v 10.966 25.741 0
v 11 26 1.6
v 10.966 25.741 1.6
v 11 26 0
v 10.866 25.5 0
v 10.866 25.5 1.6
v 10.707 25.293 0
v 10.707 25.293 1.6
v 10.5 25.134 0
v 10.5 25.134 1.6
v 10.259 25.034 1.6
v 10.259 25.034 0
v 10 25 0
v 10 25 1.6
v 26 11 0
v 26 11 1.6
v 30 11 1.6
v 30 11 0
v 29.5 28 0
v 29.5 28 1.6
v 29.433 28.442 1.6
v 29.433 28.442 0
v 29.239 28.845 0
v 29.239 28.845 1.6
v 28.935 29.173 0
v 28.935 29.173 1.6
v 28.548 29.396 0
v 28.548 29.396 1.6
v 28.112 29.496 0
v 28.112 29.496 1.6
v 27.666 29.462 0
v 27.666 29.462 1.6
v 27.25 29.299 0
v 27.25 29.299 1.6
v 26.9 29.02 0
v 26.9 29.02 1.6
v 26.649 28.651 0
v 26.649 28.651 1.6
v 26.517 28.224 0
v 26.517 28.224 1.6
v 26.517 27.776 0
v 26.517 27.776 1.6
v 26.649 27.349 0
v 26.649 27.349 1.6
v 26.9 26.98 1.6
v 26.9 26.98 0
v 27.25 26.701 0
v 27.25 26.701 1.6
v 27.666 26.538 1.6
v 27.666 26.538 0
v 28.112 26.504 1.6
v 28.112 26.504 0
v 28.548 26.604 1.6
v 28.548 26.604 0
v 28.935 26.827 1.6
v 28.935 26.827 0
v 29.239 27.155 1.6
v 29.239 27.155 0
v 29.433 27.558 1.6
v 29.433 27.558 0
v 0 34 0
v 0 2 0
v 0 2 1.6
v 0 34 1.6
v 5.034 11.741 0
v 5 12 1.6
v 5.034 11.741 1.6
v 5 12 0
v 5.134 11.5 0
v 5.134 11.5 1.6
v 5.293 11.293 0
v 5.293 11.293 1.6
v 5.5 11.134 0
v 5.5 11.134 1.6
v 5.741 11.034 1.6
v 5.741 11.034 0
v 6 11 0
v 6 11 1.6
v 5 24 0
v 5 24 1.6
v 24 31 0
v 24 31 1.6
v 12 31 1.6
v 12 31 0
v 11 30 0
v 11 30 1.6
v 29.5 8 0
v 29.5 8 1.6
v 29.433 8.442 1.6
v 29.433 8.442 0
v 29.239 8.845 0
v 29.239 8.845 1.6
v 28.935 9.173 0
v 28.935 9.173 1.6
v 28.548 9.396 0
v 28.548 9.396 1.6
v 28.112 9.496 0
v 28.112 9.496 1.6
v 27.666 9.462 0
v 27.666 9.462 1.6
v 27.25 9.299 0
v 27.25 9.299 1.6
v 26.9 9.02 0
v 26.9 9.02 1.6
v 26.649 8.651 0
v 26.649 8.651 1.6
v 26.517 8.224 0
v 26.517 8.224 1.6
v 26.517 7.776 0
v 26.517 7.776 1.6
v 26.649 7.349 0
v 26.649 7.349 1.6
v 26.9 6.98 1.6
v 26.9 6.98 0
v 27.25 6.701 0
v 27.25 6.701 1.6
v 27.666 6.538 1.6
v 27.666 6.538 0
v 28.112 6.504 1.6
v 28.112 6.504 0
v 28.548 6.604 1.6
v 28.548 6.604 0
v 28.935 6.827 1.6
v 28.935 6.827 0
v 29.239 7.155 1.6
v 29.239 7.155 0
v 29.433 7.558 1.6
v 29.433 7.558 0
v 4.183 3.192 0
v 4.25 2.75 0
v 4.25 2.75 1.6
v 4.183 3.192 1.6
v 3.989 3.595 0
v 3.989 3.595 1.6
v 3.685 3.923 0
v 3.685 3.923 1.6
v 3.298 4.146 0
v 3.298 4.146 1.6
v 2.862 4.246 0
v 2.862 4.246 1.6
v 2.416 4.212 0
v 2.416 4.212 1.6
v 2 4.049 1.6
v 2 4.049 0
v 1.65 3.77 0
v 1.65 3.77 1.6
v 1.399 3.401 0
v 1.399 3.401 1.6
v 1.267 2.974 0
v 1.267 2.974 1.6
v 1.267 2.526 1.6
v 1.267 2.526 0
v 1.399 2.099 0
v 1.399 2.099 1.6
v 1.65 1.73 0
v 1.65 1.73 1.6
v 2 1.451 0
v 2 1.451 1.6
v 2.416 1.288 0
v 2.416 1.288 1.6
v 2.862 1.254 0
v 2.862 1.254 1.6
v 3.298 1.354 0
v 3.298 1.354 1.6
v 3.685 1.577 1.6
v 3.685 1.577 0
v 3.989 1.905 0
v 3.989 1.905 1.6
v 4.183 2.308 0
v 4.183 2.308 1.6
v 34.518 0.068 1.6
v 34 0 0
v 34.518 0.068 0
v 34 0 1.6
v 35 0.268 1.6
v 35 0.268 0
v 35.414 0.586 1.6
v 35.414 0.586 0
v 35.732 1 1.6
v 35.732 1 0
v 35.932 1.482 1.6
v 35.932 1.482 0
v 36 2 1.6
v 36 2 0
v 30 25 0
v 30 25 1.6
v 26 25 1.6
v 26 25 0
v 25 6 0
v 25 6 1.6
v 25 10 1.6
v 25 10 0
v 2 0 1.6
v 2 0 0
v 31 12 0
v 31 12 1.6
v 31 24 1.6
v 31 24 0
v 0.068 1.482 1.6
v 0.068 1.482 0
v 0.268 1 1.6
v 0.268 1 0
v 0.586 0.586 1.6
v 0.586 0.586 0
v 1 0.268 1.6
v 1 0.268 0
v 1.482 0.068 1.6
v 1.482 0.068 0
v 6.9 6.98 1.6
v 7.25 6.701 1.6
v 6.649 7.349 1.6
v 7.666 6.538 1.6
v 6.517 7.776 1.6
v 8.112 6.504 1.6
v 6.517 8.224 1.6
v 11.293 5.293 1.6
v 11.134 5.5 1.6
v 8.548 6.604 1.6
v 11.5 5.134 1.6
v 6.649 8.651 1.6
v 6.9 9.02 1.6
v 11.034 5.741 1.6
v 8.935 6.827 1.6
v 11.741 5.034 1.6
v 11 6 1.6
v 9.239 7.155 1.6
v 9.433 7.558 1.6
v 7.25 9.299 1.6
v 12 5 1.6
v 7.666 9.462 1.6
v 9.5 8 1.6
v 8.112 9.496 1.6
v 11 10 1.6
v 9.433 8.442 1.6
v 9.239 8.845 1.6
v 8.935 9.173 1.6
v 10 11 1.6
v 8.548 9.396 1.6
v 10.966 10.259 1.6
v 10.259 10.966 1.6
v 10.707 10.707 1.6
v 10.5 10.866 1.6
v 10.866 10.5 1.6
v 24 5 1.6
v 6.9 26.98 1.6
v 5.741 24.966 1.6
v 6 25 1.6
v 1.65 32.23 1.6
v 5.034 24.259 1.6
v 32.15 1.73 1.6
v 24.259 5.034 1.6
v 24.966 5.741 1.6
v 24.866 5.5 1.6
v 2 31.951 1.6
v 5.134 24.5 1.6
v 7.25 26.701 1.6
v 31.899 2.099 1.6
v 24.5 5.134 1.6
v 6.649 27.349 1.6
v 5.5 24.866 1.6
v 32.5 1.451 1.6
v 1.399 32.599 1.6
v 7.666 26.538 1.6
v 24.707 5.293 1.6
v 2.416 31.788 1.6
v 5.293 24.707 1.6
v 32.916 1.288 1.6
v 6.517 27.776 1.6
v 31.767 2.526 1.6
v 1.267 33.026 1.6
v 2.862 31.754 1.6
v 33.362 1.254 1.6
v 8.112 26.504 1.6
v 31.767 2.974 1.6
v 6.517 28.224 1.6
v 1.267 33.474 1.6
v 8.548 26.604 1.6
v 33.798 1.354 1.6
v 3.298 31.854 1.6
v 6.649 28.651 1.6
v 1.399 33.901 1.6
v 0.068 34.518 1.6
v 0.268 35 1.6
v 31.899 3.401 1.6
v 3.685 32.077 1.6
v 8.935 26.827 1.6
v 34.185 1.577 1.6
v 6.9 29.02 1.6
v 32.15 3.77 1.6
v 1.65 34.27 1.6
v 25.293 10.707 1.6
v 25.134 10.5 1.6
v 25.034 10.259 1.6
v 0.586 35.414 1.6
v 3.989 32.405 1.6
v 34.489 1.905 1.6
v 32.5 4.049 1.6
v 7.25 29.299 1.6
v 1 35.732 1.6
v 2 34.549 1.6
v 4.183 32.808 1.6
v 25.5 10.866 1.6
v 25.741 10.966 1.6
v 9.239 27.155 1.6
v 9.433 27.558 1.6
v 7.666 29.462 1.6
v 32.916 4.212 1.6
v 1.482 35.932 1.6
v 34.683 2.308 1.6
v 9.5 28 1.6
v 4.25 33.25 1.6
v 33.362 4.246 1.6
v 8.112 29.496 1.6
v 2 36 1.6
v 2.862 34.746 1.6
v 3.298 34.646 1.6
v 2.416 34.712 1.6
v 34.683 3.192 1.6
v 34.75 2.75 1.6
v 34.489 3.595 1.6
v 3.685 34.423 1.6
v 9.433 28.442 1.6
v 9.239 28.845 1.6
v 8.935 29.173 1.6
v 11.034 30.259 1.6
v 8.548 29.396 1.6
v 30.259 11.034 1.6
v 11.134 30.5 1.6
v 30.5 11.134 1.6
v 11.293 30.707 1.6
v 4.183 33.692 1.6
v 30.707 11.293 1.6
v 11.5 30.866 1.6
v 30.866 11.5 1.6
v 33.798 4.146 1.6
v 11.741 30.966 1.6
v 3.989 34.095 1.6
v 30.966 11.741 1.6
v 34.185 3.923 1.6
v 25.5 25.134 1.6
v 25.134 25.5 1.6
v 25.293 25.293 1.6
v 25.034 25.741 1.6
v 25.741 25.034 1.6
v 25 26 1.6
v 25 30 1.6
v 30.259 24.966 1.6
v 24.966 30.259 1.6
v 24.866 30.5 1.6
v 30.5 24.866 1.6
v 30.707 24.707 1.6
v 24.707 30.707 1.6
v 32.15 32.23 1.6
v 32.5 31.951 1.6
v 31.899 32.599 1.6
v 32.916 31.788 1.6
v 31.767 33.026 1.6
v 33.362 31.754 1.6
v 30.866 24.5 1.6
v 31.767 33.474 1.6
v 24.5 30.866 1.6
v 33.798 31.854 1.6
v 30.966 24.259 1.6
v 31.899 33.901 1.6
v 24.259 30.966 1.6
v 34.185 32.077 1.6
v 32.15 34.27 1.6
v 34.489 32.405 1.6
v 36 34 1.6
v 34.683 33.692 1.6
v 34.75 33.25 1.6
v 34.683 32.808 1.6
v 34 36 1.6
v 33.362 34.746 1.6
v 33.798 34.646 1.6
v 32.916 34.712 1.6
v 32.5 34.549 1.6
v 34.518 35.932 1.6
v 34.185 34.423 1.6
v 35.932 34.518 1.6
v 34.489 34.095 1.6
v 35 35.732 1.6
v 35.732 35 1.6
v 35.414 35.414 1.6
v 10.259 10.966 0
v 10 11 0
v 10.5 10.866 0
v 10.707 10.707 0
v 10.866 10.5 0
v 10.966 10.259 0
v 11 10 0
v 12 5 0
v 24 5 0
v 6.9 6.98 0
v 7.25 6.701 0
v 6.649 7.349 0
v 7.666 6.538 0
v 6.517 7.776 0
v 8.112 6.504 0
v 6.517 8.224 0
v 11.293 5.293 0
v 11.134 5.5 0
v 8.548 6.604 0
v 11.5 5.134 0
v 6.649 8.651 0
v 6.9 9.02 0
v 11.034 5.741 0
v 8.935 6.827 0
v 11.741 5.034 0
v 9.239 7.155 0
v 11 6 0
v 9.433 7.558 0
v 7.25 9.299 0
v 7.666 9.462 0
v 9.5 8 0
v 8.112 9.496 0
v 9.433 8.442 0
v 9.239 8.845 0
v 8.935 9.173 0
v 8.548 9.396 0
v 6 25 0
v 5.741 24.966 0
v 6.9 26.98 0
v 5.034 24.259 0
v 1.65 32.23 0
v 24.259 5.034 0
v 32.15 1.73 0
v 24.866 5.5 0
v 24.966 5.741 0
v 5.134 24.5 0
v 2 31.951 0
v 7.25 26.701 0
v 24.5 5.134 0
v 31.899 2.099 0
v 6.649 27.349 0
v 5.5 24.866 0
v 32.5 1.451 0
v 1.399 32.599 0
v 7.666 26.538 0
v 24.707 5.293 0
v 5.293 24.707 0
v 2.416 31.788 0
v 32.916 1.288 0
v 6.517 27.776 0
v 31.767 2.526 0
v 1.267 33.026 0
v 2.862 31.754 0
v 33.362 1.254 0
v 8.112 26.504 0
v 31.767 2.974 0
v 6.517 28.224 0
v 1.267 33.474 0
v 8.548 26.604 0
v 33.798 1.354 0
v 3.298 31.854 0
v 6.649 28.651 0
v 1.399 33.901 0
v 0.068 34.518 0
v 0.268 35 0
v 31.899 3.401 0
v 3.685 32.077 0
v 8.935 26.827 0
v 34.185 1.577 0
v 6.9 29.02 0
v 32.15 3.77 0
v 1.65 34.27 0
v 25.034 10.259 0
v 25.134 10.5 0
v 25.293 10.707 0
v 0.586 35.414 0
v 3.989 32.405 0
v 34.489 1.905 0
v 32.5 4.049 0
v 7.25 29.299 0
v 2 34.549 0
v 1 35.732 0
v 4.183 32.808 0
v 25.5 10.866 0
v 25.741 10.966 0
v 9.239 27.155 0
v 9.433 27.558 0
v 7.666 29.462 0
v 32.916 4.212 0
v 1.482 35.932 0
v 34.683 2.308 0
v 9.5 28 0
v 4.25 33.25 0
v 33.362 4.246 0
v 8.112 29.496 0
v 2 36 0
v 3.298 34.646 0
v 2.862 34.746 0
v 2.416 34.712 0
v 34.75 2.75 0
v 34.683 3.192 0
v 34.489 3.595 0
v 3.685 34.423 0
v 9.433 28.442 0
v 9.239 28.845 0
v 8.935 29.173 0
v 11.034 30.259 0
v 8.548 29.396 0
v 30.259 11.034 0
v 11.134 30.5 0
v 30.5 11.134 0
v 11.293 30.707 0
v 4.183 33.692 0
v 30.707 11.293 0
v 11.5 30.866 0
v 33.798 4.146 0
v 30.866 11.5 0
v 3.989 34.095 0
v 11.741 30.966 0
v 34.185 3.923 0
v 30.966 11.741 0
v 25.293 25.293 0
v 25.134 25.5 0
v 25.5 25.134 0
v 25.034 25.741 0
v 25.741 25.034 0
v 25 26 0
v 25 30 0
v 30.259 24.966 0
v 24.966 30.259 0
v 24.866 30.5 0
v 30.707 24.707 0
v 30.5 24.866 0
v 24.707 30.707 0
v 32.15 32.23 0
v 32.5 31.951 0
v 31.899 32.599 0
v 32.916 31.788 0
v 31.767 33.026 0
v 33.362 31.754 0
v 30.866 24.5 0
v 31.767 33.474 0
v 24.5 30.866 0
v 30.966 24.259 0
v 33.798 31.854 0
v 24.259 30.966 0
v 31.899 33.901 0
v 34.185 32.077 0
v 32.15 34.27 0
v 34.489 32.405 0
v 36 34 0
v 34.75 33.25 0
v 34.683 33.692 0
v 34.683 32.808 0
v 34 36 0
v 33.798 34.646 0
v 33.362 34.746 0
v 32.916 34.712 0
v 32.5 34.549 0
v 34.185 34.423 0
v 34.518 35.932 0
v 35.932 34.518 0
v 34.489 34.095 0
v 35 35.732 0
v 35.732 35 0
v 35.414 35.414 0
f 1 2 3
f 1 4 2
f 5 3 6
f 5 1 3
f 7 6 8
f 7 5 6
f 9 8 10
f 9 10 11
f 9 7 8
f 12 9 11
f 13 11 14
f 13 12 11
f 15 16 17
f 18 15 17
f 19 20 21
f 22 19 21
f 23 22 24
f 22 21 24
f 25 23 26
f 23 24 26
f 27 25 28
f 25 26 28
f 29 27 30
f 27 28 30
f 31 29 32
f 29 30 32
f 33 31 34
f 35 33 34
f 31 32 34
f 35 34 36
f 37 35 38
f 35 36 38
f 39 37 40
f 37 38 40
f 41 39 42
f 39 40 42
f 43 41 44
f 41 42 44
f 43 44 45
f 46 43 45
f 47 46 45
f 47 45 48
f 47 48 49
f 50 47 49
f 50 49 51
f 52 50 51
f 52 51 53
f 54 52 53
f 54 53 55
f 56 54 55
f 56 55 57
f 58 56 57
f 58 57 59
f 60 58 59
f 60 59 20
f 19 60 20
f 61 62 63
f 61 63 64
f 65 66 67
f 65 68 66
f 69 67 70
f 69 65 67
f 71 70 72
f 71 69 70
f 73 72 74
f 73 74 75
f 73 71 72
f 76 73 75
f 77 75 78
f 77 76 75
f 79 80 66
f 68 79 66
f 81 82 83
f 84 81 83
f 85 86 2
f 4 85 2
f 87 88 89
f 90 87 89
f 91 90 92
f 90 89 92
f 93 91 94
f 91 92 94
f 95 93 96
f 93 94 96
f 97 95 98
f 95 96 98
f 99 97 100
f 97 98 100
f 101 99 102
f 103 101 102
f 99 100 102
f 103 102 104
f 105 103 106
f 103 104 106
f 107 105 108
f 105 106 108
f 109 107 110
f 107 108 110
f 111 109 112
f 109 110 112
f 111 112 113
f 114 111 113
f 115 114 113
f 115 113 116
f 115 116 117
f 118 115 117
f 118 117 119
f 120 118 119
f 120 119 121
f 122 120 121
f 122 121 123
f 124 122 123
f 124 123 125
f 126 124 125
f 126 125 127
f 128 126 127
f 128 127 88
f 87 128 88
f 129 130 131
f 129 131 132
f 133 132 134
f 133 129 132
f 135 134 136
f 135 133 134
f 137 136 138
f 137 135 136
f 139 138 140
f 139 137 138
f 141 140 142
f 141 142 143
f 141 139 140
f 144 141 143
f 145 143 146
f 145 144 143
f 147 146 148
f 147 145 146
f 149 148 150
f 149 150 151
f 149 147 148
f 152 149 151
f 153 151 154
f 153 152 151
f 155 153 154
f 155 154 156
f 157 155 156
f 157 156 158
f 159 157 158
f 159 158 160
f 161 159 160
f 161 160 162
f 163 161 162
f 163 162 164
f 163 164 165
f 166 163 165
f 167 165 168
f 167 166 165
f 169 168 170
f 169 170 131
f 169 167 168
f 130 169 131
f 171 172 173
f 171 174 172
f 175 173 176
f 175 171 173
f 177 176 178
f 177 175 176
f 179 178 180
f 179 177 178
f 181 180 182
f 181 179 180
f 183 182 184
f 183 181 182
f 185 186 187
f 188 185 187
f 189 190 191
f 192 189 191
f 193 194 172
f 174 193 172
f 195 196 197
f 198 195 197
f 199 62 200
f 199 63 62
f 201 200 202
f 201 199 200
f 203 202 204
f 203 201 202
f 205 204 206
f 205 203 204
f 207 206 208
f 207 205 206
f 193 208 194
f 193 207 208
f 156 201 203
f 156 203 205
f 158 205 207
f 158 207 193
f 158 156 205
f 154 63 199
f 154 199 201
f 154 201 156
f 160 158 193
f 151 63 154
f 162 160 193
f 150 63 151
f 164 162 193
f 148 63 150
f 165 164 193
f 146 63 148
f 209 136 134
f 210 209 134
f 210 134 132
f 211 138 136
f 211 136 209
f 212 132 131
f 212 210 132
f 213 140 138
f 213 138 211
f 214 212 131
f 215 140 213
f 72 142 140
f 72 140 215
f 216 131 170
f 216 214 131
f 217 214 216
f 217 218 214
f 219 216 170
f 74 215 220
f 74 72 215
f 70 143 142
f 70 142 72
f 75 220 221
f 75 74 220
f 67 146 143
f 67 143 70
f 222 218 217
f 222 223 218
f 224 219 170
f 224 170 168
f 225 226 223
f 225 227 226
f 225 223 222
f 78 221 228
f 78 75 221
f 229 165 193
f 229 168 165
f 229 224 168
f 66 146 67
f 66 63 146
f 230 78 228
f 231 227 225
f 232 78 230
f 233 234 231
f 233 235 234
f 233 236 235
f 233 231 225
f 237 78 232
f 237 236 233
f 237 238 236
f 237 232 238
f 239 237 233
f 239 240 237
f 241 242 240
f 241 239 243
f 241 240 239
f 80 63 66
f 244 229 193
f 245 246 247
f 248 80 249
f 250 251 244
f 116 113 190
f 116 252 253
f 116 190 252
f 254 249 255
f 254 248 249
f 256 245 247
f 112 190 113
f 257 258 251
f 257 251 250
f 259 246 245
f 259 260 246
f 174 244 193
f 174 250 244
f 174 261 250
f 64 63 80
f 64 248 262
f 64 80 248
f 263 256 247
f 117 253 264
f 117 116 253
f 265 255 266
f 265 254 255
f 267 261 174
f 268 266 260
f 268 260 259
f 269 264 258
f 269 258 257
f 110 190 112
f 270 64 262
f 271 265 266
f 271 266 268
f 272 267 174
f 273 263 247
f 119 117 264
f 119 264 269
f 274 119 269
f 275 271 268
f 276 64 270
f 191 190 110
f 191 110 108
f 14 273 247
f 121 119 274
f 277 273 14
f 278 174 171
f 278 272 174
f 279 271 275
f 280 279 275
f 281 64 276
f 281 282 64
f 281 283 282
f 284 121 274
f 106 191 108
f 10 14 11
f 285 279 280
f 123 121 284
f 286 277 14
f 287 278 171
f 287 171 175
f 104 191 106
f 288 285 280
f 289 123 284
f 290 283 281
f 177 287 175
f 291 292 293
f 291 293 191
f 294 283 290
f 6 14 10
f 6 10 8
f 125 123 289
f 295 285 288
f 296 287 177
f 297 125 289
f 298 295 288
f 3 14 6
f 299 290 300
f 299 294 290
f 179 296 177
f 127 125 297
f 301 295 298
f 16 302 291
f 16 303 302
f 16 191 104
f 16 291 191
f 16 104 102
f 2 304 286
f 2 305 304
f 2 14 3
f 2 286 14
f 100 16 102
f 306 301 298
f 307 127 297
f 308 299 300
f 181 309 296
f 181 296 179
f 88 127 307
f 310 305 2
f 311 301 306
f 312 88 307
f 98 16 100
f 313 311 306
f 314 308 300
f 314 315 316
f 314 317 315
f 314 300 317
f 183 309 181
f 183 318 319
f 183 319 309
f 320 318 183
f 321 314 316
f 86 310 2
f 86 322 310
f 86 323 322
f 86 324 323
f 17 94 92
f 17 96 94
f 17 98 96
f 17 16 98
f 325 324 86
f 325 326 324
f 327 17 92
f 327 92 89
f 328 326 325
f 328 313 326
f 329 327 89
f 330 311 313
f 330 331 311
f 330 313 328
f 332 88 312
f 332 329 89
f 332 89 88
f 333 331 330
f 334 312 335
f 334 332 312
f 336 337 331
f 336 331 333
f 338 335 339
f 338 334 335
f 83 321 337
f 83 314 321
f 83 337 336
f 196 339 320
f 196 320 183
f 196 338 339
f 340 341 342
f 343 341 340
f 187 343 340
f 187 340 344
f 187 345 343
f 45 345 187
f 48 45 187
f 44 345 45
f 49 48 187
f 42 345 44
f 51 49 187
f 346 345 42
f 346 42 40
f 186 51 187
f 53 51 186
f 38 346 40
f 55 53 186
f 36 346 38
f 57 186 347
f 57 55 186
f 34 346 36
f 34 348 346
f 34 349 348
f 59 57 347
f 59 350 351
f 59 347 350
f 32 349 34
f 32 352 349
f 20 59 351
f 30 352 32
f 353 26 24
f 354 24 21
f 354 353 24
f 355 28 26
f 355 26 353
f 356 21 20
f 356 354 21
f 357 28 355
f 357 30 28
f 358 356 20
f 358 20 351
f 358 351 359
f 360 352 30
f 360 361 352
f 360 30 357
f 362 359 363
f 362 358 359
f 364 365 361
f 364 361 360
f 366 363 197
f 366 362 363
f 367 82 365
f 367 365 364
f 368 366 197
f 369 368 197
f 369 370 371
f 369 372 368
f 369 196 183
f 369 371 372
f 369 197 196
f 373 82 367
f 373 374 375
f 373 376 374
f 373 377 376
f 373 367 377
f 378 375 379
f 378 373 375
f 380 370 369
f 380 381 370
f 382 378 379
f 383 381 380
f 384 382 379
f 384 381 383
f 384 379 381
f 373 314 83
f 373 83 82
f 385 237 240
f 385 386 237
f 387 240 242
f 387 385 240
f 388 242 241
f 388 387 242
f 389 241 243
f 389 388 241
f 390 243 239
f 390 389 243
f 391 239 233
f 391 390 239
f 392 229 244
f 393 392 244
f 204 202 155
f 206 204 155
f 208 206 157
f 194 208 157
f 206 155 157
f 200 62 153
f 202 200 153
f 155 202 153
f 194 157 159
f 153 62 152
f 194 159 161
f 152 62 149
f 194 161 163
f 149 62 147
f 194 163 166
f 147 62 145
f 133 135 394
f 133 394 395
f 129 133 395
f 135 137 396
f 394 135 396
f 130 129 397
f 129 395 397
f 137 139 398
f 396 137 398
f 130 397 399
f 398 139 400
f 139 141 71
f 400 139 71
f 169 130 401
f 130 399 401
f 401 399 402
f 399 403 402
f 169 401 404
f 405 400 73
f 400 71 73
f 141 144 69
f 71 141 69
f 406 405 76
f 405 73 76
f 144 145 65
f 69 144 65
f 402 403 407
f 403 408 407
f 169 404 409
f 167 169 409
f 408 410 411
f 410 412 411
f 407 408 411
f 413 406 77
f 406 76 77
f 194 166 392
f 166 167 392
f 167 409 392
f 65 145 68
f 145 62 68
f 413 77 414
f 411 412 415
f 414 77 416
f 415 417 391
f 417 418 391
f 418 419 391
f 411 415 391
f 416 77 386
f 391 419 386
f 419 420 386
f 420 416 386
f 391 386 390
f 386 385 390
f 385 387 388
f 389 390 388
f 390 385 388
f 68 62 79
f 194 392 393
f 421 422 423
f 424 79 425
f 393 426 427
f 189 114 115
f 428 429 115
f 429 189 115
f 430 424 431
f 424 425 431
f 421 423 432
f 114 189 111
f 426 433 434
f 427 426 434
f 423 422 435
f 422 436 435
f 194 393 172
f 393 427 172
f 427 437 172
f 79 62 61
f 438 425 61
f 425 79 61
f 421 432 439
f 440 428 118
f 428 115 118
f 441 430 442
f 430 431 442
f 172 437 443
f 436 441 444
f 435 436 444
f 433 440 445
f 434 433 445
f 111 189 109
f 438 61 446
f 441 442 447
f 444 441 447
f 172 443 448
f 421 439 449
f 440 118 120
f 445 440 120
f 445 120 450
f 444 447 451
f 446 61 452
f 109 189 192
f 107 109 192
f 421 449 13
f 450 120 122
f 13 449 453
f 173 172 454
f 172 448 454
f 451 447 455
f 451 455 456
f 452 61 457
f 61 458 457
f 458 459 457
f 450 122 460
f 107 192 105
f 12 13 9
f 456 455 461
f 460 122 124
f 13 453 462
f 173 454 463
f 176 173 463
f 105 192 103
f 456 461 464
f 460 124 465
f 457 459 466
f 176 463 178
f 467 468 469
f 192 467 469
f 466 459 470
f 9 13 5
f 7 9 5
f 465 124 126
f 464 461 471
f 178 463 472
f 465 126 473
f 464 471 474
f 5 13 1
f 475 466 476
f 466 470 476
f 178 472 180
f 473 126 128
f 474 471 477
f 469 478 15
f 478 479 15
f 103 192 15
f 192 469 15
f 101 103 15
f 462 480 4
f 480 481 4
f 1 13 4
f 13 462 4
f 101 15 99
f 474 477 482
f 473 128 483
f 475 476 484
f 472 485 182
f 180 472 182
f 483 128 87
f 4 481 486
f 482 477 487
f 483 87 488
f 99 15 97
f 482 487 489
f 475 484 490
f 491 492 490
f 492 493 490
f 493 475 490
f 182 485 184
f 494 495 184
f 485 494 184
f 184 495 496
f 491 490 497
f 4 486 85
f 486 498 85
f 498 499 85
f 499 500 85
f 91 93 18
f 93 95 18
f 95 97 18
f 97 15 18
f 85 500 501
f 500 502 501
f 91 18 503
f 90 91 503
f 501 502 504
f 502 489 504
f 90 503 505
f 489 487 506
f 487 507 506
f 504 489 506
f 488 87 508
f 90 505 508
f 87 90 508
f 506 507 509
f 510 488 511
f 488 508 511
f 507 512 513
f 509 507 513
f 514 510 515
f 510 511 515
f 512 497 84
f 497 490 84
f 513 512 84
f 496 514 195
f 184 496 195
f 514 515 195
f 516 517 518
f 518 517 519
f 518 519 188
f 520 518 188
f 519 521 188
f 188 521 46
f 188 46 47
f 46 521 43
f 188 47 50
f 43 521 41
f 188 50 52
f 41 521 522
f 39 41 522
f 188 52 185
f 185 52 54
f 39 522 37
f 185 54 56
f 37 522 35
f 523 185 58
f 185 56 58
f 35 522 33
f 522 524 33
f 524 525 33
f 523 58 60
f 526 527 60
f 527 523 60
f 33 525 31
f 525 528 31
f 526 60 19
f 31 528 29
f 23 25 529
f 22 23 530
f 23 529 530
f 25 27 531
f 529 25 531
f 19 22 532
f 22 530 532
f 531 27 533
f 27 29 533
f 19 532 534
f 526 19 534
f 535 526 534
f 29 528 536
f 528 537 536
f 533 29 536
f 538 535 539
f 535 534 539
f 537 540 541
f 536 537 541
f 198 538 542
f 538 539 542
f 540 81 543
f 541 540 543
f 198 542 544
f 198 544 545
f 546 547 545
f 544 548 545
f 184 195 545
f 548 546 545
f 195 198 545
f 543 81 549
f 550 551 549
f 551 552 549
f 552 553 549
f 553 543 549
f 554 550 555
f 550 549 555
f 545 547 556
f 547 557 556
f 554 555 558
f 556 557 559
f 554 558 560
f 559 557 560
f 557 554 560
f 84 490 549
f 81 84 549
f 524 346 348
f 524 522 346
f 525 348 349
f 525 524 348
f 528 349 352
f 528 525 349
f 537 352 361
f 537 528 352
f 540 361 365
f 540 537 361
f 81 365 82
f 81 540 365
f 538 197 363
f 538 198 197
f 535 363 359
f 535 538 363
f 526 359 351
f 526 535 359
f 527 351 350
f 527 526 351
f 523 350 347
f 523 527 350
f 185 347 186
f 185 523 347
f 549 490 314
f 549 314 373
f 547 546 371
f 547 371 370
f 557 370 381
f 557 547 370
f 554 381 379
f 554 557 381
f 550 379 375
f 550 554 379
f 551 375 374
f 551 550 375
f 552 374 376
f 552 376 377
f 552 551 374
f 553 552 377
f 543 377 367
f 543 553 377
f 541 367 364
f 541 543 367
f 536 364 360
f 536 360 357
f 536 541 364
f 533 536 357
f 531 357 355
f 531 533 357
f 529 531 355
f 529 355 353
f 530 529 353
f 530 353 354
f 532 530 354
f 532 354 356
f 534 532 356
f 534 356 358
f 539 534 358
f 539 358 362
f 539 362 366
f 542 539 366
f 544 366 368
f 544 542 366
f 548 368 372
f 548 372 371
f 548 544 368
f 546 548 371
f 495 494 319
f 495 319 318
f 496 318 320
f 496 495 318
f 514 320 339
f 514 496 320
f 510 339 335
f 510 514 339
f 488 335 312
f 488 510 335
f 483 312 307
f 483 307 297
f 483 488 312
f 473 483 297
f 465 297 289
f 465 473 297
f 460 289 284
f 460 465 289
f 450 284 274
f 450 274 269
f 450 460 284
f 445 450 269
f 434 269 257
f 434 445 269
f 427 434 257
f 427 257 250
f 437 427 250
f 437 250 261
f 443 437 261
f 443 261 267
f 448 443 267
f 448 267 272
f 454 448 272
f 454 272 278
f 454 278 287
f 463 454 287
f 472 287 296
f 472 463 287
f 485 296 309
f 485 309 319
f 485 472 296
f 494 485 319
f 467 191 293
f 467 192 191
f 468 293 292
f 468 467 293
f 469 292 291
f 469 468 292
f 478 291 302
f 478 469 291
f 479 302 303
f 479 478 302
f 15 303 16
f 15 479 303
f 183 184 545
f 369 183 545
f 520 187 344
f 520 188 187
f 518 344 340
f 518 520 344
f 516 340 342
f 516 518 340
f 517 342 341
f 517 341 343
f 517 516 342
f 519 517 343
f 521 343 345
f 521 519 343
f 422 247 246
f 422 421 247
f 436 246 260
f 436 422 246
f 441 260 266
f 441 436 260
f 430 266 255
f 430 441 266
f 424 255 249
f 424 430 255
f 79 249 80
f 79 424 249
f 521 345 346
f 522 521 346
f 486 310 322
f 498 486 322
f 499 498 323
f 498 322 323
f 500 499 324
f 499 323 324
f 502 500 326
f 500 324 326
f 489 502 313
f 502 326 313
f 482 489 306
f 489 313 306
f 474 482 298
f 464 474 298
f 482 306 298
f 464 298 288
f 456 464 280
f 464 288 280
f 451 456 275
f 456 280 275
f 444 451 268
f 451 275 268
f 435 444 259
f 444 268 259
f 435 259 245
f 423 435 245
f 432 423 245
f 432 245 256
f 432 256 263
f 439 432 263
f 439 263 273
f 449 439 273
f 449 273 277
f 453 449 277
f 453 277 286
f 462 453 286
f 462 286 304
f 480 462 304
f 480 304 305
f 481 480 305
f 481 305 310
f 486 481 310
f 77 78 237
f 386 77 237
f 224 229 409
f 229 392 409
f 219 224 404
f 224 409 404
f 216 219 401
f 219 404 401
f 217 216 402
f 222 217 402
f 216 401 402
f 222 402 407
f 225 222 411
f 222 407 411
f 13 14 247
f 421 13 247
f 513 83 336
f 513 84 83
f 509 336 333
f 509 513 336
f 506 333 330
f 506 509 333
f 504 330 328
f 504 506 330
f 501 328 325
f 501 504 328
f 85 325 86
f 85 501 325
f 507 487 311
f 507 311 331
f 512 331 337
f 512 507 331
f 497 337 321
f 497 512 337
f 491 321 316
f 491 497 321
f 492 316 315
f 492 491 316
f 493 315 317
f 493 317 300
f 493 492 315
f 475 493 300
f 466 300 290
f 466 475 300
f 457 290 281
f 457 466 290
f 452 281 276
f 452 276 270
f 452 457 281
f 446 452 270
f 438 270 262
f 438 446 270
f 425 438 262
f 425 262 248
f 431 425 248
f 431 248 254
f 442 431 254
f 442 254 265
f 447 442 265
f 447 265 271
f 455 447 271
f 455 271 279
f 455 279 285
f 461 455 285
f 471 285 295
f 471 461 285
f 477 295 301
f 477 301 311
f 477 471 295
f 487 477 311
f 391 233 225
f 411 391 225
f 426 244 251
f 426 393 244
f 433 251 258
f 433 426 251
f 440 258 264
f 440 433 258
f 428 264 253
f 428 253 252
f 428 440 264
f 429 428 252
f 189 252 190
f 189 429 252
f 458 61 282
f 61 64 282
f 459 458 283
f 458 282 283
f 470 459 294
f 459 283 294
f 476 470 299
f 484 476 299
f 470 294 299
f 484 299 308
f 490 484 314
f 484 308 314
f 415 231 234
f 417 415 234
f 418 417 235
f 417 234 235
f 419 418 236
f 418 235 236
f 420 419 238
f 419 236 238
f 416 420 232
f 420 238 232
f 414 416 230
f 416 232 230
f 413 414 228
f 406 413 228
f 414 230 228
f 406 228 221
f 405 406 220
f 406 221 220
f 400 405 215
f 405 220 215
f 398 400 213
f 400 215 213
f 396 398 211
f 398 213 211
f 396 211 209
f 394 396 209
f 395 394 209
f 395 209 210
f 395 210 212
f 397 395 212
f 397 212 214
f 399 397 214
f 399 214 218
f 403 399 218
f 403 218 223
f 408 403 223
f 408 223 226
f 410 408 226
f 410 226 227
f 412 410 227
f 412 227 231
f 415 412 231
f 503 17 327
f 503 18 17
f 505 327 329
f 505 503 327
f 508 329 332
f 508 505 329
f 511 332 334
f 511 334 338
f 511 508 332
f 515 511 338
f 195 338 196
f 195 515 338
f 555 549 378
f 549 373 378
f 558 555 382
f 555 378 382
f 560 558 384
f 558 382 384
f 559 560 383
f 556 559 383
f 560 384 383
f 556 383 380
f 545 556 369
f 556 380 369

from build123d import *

# Parameters (mm, degrees)
F0_W     = 36
F0_H     = 36
F0_R     = 1.5
F1_DEPTH = 1.6
F2_R     = 2
F3_R     = 1.5
F4_DEPTH = 25
F6_DEPTH = 25
F7_R     = 1


with BuildPart() as f1:
    # F0 (on Top) → F1 (new body)
    with BuildSketch(Plane.XY):
        with Locations((18, 18)):
            Rectangle(F0_W, F0_H)
        with Locations((2.75, 2.75)):
            Circle(F0_R, mode=Mode.SUBTRACT)
        with Locations((33.25, 2.75)):
            Circle(F0_R, mode=Mode.SUBTRACT)
        with Locations((2.75, 33.25)):
            Circle(F0_R, mode=Mode.SUBTRACT)
        with Locations((33.25, 33.25)):
            Circle(F0_R, mode=Mode.SUBTRACT)
    extrude(amount=F1_DEPTH)

    # F2
    f2_edges = [f1.edges().sort_by_distance(p)[0] for p in [
        (0, 36, 0.8),
        (36, 36, 0.8),
        (36, 0, 0.8),
        (0, 0, 0.8),
    ]]
    fillet(f2_edges, radius=F2_R)

    # F3 (on face) → F4 (cut)
    with BuildSketch(Plane.XY.offset(1.6)):
        with Locations((8, 28)):
            Circle(F3_R)
        with Locations((8, 8)):
            Circle(F3_R)
        with Locations((28, 28)):
            Circle(F3_R)
        with Locations((28, 8)):
            Circle(F3_R)
    extrude(amount=-F4_DEPTH, mode=Mode.SUBTRACT)

    # F5 (on face) → F6 (cut)
    with BuildSketch(Plane.XY.offset(1.6)):
        Polygon((11, 5), (25, 5), (25, 11), (31, 11), (31, 25), (25, 25), (25, 31), (11, 31), (11, 25), (5, 25), (5, 11), (11, 11), align=None)
    extrude(amount=-F6_DEPTH, mode=Mode.SUBTRACT)

    # F7
    f7_edges = [f1.edges().sort_by_distance(p)[0] for p in [
        (11, 25, 0.8),
        (25, 25, 0.8),
        (25, 11, 0.8),
        (11, 11, 0.8),
        (11, 5, 0.8),
        (5, 11, 0.8),
        (25, 5, 0.8),
        (31, 11, 0.8),
        (5, 25, 0.8),
        (11, 31, 0.8),
        (31, 25, 0.8),
        (25, 31, 0.8),
    ]]
    fillet(f7_edges, radius=F7_R)


solid = f1.part
